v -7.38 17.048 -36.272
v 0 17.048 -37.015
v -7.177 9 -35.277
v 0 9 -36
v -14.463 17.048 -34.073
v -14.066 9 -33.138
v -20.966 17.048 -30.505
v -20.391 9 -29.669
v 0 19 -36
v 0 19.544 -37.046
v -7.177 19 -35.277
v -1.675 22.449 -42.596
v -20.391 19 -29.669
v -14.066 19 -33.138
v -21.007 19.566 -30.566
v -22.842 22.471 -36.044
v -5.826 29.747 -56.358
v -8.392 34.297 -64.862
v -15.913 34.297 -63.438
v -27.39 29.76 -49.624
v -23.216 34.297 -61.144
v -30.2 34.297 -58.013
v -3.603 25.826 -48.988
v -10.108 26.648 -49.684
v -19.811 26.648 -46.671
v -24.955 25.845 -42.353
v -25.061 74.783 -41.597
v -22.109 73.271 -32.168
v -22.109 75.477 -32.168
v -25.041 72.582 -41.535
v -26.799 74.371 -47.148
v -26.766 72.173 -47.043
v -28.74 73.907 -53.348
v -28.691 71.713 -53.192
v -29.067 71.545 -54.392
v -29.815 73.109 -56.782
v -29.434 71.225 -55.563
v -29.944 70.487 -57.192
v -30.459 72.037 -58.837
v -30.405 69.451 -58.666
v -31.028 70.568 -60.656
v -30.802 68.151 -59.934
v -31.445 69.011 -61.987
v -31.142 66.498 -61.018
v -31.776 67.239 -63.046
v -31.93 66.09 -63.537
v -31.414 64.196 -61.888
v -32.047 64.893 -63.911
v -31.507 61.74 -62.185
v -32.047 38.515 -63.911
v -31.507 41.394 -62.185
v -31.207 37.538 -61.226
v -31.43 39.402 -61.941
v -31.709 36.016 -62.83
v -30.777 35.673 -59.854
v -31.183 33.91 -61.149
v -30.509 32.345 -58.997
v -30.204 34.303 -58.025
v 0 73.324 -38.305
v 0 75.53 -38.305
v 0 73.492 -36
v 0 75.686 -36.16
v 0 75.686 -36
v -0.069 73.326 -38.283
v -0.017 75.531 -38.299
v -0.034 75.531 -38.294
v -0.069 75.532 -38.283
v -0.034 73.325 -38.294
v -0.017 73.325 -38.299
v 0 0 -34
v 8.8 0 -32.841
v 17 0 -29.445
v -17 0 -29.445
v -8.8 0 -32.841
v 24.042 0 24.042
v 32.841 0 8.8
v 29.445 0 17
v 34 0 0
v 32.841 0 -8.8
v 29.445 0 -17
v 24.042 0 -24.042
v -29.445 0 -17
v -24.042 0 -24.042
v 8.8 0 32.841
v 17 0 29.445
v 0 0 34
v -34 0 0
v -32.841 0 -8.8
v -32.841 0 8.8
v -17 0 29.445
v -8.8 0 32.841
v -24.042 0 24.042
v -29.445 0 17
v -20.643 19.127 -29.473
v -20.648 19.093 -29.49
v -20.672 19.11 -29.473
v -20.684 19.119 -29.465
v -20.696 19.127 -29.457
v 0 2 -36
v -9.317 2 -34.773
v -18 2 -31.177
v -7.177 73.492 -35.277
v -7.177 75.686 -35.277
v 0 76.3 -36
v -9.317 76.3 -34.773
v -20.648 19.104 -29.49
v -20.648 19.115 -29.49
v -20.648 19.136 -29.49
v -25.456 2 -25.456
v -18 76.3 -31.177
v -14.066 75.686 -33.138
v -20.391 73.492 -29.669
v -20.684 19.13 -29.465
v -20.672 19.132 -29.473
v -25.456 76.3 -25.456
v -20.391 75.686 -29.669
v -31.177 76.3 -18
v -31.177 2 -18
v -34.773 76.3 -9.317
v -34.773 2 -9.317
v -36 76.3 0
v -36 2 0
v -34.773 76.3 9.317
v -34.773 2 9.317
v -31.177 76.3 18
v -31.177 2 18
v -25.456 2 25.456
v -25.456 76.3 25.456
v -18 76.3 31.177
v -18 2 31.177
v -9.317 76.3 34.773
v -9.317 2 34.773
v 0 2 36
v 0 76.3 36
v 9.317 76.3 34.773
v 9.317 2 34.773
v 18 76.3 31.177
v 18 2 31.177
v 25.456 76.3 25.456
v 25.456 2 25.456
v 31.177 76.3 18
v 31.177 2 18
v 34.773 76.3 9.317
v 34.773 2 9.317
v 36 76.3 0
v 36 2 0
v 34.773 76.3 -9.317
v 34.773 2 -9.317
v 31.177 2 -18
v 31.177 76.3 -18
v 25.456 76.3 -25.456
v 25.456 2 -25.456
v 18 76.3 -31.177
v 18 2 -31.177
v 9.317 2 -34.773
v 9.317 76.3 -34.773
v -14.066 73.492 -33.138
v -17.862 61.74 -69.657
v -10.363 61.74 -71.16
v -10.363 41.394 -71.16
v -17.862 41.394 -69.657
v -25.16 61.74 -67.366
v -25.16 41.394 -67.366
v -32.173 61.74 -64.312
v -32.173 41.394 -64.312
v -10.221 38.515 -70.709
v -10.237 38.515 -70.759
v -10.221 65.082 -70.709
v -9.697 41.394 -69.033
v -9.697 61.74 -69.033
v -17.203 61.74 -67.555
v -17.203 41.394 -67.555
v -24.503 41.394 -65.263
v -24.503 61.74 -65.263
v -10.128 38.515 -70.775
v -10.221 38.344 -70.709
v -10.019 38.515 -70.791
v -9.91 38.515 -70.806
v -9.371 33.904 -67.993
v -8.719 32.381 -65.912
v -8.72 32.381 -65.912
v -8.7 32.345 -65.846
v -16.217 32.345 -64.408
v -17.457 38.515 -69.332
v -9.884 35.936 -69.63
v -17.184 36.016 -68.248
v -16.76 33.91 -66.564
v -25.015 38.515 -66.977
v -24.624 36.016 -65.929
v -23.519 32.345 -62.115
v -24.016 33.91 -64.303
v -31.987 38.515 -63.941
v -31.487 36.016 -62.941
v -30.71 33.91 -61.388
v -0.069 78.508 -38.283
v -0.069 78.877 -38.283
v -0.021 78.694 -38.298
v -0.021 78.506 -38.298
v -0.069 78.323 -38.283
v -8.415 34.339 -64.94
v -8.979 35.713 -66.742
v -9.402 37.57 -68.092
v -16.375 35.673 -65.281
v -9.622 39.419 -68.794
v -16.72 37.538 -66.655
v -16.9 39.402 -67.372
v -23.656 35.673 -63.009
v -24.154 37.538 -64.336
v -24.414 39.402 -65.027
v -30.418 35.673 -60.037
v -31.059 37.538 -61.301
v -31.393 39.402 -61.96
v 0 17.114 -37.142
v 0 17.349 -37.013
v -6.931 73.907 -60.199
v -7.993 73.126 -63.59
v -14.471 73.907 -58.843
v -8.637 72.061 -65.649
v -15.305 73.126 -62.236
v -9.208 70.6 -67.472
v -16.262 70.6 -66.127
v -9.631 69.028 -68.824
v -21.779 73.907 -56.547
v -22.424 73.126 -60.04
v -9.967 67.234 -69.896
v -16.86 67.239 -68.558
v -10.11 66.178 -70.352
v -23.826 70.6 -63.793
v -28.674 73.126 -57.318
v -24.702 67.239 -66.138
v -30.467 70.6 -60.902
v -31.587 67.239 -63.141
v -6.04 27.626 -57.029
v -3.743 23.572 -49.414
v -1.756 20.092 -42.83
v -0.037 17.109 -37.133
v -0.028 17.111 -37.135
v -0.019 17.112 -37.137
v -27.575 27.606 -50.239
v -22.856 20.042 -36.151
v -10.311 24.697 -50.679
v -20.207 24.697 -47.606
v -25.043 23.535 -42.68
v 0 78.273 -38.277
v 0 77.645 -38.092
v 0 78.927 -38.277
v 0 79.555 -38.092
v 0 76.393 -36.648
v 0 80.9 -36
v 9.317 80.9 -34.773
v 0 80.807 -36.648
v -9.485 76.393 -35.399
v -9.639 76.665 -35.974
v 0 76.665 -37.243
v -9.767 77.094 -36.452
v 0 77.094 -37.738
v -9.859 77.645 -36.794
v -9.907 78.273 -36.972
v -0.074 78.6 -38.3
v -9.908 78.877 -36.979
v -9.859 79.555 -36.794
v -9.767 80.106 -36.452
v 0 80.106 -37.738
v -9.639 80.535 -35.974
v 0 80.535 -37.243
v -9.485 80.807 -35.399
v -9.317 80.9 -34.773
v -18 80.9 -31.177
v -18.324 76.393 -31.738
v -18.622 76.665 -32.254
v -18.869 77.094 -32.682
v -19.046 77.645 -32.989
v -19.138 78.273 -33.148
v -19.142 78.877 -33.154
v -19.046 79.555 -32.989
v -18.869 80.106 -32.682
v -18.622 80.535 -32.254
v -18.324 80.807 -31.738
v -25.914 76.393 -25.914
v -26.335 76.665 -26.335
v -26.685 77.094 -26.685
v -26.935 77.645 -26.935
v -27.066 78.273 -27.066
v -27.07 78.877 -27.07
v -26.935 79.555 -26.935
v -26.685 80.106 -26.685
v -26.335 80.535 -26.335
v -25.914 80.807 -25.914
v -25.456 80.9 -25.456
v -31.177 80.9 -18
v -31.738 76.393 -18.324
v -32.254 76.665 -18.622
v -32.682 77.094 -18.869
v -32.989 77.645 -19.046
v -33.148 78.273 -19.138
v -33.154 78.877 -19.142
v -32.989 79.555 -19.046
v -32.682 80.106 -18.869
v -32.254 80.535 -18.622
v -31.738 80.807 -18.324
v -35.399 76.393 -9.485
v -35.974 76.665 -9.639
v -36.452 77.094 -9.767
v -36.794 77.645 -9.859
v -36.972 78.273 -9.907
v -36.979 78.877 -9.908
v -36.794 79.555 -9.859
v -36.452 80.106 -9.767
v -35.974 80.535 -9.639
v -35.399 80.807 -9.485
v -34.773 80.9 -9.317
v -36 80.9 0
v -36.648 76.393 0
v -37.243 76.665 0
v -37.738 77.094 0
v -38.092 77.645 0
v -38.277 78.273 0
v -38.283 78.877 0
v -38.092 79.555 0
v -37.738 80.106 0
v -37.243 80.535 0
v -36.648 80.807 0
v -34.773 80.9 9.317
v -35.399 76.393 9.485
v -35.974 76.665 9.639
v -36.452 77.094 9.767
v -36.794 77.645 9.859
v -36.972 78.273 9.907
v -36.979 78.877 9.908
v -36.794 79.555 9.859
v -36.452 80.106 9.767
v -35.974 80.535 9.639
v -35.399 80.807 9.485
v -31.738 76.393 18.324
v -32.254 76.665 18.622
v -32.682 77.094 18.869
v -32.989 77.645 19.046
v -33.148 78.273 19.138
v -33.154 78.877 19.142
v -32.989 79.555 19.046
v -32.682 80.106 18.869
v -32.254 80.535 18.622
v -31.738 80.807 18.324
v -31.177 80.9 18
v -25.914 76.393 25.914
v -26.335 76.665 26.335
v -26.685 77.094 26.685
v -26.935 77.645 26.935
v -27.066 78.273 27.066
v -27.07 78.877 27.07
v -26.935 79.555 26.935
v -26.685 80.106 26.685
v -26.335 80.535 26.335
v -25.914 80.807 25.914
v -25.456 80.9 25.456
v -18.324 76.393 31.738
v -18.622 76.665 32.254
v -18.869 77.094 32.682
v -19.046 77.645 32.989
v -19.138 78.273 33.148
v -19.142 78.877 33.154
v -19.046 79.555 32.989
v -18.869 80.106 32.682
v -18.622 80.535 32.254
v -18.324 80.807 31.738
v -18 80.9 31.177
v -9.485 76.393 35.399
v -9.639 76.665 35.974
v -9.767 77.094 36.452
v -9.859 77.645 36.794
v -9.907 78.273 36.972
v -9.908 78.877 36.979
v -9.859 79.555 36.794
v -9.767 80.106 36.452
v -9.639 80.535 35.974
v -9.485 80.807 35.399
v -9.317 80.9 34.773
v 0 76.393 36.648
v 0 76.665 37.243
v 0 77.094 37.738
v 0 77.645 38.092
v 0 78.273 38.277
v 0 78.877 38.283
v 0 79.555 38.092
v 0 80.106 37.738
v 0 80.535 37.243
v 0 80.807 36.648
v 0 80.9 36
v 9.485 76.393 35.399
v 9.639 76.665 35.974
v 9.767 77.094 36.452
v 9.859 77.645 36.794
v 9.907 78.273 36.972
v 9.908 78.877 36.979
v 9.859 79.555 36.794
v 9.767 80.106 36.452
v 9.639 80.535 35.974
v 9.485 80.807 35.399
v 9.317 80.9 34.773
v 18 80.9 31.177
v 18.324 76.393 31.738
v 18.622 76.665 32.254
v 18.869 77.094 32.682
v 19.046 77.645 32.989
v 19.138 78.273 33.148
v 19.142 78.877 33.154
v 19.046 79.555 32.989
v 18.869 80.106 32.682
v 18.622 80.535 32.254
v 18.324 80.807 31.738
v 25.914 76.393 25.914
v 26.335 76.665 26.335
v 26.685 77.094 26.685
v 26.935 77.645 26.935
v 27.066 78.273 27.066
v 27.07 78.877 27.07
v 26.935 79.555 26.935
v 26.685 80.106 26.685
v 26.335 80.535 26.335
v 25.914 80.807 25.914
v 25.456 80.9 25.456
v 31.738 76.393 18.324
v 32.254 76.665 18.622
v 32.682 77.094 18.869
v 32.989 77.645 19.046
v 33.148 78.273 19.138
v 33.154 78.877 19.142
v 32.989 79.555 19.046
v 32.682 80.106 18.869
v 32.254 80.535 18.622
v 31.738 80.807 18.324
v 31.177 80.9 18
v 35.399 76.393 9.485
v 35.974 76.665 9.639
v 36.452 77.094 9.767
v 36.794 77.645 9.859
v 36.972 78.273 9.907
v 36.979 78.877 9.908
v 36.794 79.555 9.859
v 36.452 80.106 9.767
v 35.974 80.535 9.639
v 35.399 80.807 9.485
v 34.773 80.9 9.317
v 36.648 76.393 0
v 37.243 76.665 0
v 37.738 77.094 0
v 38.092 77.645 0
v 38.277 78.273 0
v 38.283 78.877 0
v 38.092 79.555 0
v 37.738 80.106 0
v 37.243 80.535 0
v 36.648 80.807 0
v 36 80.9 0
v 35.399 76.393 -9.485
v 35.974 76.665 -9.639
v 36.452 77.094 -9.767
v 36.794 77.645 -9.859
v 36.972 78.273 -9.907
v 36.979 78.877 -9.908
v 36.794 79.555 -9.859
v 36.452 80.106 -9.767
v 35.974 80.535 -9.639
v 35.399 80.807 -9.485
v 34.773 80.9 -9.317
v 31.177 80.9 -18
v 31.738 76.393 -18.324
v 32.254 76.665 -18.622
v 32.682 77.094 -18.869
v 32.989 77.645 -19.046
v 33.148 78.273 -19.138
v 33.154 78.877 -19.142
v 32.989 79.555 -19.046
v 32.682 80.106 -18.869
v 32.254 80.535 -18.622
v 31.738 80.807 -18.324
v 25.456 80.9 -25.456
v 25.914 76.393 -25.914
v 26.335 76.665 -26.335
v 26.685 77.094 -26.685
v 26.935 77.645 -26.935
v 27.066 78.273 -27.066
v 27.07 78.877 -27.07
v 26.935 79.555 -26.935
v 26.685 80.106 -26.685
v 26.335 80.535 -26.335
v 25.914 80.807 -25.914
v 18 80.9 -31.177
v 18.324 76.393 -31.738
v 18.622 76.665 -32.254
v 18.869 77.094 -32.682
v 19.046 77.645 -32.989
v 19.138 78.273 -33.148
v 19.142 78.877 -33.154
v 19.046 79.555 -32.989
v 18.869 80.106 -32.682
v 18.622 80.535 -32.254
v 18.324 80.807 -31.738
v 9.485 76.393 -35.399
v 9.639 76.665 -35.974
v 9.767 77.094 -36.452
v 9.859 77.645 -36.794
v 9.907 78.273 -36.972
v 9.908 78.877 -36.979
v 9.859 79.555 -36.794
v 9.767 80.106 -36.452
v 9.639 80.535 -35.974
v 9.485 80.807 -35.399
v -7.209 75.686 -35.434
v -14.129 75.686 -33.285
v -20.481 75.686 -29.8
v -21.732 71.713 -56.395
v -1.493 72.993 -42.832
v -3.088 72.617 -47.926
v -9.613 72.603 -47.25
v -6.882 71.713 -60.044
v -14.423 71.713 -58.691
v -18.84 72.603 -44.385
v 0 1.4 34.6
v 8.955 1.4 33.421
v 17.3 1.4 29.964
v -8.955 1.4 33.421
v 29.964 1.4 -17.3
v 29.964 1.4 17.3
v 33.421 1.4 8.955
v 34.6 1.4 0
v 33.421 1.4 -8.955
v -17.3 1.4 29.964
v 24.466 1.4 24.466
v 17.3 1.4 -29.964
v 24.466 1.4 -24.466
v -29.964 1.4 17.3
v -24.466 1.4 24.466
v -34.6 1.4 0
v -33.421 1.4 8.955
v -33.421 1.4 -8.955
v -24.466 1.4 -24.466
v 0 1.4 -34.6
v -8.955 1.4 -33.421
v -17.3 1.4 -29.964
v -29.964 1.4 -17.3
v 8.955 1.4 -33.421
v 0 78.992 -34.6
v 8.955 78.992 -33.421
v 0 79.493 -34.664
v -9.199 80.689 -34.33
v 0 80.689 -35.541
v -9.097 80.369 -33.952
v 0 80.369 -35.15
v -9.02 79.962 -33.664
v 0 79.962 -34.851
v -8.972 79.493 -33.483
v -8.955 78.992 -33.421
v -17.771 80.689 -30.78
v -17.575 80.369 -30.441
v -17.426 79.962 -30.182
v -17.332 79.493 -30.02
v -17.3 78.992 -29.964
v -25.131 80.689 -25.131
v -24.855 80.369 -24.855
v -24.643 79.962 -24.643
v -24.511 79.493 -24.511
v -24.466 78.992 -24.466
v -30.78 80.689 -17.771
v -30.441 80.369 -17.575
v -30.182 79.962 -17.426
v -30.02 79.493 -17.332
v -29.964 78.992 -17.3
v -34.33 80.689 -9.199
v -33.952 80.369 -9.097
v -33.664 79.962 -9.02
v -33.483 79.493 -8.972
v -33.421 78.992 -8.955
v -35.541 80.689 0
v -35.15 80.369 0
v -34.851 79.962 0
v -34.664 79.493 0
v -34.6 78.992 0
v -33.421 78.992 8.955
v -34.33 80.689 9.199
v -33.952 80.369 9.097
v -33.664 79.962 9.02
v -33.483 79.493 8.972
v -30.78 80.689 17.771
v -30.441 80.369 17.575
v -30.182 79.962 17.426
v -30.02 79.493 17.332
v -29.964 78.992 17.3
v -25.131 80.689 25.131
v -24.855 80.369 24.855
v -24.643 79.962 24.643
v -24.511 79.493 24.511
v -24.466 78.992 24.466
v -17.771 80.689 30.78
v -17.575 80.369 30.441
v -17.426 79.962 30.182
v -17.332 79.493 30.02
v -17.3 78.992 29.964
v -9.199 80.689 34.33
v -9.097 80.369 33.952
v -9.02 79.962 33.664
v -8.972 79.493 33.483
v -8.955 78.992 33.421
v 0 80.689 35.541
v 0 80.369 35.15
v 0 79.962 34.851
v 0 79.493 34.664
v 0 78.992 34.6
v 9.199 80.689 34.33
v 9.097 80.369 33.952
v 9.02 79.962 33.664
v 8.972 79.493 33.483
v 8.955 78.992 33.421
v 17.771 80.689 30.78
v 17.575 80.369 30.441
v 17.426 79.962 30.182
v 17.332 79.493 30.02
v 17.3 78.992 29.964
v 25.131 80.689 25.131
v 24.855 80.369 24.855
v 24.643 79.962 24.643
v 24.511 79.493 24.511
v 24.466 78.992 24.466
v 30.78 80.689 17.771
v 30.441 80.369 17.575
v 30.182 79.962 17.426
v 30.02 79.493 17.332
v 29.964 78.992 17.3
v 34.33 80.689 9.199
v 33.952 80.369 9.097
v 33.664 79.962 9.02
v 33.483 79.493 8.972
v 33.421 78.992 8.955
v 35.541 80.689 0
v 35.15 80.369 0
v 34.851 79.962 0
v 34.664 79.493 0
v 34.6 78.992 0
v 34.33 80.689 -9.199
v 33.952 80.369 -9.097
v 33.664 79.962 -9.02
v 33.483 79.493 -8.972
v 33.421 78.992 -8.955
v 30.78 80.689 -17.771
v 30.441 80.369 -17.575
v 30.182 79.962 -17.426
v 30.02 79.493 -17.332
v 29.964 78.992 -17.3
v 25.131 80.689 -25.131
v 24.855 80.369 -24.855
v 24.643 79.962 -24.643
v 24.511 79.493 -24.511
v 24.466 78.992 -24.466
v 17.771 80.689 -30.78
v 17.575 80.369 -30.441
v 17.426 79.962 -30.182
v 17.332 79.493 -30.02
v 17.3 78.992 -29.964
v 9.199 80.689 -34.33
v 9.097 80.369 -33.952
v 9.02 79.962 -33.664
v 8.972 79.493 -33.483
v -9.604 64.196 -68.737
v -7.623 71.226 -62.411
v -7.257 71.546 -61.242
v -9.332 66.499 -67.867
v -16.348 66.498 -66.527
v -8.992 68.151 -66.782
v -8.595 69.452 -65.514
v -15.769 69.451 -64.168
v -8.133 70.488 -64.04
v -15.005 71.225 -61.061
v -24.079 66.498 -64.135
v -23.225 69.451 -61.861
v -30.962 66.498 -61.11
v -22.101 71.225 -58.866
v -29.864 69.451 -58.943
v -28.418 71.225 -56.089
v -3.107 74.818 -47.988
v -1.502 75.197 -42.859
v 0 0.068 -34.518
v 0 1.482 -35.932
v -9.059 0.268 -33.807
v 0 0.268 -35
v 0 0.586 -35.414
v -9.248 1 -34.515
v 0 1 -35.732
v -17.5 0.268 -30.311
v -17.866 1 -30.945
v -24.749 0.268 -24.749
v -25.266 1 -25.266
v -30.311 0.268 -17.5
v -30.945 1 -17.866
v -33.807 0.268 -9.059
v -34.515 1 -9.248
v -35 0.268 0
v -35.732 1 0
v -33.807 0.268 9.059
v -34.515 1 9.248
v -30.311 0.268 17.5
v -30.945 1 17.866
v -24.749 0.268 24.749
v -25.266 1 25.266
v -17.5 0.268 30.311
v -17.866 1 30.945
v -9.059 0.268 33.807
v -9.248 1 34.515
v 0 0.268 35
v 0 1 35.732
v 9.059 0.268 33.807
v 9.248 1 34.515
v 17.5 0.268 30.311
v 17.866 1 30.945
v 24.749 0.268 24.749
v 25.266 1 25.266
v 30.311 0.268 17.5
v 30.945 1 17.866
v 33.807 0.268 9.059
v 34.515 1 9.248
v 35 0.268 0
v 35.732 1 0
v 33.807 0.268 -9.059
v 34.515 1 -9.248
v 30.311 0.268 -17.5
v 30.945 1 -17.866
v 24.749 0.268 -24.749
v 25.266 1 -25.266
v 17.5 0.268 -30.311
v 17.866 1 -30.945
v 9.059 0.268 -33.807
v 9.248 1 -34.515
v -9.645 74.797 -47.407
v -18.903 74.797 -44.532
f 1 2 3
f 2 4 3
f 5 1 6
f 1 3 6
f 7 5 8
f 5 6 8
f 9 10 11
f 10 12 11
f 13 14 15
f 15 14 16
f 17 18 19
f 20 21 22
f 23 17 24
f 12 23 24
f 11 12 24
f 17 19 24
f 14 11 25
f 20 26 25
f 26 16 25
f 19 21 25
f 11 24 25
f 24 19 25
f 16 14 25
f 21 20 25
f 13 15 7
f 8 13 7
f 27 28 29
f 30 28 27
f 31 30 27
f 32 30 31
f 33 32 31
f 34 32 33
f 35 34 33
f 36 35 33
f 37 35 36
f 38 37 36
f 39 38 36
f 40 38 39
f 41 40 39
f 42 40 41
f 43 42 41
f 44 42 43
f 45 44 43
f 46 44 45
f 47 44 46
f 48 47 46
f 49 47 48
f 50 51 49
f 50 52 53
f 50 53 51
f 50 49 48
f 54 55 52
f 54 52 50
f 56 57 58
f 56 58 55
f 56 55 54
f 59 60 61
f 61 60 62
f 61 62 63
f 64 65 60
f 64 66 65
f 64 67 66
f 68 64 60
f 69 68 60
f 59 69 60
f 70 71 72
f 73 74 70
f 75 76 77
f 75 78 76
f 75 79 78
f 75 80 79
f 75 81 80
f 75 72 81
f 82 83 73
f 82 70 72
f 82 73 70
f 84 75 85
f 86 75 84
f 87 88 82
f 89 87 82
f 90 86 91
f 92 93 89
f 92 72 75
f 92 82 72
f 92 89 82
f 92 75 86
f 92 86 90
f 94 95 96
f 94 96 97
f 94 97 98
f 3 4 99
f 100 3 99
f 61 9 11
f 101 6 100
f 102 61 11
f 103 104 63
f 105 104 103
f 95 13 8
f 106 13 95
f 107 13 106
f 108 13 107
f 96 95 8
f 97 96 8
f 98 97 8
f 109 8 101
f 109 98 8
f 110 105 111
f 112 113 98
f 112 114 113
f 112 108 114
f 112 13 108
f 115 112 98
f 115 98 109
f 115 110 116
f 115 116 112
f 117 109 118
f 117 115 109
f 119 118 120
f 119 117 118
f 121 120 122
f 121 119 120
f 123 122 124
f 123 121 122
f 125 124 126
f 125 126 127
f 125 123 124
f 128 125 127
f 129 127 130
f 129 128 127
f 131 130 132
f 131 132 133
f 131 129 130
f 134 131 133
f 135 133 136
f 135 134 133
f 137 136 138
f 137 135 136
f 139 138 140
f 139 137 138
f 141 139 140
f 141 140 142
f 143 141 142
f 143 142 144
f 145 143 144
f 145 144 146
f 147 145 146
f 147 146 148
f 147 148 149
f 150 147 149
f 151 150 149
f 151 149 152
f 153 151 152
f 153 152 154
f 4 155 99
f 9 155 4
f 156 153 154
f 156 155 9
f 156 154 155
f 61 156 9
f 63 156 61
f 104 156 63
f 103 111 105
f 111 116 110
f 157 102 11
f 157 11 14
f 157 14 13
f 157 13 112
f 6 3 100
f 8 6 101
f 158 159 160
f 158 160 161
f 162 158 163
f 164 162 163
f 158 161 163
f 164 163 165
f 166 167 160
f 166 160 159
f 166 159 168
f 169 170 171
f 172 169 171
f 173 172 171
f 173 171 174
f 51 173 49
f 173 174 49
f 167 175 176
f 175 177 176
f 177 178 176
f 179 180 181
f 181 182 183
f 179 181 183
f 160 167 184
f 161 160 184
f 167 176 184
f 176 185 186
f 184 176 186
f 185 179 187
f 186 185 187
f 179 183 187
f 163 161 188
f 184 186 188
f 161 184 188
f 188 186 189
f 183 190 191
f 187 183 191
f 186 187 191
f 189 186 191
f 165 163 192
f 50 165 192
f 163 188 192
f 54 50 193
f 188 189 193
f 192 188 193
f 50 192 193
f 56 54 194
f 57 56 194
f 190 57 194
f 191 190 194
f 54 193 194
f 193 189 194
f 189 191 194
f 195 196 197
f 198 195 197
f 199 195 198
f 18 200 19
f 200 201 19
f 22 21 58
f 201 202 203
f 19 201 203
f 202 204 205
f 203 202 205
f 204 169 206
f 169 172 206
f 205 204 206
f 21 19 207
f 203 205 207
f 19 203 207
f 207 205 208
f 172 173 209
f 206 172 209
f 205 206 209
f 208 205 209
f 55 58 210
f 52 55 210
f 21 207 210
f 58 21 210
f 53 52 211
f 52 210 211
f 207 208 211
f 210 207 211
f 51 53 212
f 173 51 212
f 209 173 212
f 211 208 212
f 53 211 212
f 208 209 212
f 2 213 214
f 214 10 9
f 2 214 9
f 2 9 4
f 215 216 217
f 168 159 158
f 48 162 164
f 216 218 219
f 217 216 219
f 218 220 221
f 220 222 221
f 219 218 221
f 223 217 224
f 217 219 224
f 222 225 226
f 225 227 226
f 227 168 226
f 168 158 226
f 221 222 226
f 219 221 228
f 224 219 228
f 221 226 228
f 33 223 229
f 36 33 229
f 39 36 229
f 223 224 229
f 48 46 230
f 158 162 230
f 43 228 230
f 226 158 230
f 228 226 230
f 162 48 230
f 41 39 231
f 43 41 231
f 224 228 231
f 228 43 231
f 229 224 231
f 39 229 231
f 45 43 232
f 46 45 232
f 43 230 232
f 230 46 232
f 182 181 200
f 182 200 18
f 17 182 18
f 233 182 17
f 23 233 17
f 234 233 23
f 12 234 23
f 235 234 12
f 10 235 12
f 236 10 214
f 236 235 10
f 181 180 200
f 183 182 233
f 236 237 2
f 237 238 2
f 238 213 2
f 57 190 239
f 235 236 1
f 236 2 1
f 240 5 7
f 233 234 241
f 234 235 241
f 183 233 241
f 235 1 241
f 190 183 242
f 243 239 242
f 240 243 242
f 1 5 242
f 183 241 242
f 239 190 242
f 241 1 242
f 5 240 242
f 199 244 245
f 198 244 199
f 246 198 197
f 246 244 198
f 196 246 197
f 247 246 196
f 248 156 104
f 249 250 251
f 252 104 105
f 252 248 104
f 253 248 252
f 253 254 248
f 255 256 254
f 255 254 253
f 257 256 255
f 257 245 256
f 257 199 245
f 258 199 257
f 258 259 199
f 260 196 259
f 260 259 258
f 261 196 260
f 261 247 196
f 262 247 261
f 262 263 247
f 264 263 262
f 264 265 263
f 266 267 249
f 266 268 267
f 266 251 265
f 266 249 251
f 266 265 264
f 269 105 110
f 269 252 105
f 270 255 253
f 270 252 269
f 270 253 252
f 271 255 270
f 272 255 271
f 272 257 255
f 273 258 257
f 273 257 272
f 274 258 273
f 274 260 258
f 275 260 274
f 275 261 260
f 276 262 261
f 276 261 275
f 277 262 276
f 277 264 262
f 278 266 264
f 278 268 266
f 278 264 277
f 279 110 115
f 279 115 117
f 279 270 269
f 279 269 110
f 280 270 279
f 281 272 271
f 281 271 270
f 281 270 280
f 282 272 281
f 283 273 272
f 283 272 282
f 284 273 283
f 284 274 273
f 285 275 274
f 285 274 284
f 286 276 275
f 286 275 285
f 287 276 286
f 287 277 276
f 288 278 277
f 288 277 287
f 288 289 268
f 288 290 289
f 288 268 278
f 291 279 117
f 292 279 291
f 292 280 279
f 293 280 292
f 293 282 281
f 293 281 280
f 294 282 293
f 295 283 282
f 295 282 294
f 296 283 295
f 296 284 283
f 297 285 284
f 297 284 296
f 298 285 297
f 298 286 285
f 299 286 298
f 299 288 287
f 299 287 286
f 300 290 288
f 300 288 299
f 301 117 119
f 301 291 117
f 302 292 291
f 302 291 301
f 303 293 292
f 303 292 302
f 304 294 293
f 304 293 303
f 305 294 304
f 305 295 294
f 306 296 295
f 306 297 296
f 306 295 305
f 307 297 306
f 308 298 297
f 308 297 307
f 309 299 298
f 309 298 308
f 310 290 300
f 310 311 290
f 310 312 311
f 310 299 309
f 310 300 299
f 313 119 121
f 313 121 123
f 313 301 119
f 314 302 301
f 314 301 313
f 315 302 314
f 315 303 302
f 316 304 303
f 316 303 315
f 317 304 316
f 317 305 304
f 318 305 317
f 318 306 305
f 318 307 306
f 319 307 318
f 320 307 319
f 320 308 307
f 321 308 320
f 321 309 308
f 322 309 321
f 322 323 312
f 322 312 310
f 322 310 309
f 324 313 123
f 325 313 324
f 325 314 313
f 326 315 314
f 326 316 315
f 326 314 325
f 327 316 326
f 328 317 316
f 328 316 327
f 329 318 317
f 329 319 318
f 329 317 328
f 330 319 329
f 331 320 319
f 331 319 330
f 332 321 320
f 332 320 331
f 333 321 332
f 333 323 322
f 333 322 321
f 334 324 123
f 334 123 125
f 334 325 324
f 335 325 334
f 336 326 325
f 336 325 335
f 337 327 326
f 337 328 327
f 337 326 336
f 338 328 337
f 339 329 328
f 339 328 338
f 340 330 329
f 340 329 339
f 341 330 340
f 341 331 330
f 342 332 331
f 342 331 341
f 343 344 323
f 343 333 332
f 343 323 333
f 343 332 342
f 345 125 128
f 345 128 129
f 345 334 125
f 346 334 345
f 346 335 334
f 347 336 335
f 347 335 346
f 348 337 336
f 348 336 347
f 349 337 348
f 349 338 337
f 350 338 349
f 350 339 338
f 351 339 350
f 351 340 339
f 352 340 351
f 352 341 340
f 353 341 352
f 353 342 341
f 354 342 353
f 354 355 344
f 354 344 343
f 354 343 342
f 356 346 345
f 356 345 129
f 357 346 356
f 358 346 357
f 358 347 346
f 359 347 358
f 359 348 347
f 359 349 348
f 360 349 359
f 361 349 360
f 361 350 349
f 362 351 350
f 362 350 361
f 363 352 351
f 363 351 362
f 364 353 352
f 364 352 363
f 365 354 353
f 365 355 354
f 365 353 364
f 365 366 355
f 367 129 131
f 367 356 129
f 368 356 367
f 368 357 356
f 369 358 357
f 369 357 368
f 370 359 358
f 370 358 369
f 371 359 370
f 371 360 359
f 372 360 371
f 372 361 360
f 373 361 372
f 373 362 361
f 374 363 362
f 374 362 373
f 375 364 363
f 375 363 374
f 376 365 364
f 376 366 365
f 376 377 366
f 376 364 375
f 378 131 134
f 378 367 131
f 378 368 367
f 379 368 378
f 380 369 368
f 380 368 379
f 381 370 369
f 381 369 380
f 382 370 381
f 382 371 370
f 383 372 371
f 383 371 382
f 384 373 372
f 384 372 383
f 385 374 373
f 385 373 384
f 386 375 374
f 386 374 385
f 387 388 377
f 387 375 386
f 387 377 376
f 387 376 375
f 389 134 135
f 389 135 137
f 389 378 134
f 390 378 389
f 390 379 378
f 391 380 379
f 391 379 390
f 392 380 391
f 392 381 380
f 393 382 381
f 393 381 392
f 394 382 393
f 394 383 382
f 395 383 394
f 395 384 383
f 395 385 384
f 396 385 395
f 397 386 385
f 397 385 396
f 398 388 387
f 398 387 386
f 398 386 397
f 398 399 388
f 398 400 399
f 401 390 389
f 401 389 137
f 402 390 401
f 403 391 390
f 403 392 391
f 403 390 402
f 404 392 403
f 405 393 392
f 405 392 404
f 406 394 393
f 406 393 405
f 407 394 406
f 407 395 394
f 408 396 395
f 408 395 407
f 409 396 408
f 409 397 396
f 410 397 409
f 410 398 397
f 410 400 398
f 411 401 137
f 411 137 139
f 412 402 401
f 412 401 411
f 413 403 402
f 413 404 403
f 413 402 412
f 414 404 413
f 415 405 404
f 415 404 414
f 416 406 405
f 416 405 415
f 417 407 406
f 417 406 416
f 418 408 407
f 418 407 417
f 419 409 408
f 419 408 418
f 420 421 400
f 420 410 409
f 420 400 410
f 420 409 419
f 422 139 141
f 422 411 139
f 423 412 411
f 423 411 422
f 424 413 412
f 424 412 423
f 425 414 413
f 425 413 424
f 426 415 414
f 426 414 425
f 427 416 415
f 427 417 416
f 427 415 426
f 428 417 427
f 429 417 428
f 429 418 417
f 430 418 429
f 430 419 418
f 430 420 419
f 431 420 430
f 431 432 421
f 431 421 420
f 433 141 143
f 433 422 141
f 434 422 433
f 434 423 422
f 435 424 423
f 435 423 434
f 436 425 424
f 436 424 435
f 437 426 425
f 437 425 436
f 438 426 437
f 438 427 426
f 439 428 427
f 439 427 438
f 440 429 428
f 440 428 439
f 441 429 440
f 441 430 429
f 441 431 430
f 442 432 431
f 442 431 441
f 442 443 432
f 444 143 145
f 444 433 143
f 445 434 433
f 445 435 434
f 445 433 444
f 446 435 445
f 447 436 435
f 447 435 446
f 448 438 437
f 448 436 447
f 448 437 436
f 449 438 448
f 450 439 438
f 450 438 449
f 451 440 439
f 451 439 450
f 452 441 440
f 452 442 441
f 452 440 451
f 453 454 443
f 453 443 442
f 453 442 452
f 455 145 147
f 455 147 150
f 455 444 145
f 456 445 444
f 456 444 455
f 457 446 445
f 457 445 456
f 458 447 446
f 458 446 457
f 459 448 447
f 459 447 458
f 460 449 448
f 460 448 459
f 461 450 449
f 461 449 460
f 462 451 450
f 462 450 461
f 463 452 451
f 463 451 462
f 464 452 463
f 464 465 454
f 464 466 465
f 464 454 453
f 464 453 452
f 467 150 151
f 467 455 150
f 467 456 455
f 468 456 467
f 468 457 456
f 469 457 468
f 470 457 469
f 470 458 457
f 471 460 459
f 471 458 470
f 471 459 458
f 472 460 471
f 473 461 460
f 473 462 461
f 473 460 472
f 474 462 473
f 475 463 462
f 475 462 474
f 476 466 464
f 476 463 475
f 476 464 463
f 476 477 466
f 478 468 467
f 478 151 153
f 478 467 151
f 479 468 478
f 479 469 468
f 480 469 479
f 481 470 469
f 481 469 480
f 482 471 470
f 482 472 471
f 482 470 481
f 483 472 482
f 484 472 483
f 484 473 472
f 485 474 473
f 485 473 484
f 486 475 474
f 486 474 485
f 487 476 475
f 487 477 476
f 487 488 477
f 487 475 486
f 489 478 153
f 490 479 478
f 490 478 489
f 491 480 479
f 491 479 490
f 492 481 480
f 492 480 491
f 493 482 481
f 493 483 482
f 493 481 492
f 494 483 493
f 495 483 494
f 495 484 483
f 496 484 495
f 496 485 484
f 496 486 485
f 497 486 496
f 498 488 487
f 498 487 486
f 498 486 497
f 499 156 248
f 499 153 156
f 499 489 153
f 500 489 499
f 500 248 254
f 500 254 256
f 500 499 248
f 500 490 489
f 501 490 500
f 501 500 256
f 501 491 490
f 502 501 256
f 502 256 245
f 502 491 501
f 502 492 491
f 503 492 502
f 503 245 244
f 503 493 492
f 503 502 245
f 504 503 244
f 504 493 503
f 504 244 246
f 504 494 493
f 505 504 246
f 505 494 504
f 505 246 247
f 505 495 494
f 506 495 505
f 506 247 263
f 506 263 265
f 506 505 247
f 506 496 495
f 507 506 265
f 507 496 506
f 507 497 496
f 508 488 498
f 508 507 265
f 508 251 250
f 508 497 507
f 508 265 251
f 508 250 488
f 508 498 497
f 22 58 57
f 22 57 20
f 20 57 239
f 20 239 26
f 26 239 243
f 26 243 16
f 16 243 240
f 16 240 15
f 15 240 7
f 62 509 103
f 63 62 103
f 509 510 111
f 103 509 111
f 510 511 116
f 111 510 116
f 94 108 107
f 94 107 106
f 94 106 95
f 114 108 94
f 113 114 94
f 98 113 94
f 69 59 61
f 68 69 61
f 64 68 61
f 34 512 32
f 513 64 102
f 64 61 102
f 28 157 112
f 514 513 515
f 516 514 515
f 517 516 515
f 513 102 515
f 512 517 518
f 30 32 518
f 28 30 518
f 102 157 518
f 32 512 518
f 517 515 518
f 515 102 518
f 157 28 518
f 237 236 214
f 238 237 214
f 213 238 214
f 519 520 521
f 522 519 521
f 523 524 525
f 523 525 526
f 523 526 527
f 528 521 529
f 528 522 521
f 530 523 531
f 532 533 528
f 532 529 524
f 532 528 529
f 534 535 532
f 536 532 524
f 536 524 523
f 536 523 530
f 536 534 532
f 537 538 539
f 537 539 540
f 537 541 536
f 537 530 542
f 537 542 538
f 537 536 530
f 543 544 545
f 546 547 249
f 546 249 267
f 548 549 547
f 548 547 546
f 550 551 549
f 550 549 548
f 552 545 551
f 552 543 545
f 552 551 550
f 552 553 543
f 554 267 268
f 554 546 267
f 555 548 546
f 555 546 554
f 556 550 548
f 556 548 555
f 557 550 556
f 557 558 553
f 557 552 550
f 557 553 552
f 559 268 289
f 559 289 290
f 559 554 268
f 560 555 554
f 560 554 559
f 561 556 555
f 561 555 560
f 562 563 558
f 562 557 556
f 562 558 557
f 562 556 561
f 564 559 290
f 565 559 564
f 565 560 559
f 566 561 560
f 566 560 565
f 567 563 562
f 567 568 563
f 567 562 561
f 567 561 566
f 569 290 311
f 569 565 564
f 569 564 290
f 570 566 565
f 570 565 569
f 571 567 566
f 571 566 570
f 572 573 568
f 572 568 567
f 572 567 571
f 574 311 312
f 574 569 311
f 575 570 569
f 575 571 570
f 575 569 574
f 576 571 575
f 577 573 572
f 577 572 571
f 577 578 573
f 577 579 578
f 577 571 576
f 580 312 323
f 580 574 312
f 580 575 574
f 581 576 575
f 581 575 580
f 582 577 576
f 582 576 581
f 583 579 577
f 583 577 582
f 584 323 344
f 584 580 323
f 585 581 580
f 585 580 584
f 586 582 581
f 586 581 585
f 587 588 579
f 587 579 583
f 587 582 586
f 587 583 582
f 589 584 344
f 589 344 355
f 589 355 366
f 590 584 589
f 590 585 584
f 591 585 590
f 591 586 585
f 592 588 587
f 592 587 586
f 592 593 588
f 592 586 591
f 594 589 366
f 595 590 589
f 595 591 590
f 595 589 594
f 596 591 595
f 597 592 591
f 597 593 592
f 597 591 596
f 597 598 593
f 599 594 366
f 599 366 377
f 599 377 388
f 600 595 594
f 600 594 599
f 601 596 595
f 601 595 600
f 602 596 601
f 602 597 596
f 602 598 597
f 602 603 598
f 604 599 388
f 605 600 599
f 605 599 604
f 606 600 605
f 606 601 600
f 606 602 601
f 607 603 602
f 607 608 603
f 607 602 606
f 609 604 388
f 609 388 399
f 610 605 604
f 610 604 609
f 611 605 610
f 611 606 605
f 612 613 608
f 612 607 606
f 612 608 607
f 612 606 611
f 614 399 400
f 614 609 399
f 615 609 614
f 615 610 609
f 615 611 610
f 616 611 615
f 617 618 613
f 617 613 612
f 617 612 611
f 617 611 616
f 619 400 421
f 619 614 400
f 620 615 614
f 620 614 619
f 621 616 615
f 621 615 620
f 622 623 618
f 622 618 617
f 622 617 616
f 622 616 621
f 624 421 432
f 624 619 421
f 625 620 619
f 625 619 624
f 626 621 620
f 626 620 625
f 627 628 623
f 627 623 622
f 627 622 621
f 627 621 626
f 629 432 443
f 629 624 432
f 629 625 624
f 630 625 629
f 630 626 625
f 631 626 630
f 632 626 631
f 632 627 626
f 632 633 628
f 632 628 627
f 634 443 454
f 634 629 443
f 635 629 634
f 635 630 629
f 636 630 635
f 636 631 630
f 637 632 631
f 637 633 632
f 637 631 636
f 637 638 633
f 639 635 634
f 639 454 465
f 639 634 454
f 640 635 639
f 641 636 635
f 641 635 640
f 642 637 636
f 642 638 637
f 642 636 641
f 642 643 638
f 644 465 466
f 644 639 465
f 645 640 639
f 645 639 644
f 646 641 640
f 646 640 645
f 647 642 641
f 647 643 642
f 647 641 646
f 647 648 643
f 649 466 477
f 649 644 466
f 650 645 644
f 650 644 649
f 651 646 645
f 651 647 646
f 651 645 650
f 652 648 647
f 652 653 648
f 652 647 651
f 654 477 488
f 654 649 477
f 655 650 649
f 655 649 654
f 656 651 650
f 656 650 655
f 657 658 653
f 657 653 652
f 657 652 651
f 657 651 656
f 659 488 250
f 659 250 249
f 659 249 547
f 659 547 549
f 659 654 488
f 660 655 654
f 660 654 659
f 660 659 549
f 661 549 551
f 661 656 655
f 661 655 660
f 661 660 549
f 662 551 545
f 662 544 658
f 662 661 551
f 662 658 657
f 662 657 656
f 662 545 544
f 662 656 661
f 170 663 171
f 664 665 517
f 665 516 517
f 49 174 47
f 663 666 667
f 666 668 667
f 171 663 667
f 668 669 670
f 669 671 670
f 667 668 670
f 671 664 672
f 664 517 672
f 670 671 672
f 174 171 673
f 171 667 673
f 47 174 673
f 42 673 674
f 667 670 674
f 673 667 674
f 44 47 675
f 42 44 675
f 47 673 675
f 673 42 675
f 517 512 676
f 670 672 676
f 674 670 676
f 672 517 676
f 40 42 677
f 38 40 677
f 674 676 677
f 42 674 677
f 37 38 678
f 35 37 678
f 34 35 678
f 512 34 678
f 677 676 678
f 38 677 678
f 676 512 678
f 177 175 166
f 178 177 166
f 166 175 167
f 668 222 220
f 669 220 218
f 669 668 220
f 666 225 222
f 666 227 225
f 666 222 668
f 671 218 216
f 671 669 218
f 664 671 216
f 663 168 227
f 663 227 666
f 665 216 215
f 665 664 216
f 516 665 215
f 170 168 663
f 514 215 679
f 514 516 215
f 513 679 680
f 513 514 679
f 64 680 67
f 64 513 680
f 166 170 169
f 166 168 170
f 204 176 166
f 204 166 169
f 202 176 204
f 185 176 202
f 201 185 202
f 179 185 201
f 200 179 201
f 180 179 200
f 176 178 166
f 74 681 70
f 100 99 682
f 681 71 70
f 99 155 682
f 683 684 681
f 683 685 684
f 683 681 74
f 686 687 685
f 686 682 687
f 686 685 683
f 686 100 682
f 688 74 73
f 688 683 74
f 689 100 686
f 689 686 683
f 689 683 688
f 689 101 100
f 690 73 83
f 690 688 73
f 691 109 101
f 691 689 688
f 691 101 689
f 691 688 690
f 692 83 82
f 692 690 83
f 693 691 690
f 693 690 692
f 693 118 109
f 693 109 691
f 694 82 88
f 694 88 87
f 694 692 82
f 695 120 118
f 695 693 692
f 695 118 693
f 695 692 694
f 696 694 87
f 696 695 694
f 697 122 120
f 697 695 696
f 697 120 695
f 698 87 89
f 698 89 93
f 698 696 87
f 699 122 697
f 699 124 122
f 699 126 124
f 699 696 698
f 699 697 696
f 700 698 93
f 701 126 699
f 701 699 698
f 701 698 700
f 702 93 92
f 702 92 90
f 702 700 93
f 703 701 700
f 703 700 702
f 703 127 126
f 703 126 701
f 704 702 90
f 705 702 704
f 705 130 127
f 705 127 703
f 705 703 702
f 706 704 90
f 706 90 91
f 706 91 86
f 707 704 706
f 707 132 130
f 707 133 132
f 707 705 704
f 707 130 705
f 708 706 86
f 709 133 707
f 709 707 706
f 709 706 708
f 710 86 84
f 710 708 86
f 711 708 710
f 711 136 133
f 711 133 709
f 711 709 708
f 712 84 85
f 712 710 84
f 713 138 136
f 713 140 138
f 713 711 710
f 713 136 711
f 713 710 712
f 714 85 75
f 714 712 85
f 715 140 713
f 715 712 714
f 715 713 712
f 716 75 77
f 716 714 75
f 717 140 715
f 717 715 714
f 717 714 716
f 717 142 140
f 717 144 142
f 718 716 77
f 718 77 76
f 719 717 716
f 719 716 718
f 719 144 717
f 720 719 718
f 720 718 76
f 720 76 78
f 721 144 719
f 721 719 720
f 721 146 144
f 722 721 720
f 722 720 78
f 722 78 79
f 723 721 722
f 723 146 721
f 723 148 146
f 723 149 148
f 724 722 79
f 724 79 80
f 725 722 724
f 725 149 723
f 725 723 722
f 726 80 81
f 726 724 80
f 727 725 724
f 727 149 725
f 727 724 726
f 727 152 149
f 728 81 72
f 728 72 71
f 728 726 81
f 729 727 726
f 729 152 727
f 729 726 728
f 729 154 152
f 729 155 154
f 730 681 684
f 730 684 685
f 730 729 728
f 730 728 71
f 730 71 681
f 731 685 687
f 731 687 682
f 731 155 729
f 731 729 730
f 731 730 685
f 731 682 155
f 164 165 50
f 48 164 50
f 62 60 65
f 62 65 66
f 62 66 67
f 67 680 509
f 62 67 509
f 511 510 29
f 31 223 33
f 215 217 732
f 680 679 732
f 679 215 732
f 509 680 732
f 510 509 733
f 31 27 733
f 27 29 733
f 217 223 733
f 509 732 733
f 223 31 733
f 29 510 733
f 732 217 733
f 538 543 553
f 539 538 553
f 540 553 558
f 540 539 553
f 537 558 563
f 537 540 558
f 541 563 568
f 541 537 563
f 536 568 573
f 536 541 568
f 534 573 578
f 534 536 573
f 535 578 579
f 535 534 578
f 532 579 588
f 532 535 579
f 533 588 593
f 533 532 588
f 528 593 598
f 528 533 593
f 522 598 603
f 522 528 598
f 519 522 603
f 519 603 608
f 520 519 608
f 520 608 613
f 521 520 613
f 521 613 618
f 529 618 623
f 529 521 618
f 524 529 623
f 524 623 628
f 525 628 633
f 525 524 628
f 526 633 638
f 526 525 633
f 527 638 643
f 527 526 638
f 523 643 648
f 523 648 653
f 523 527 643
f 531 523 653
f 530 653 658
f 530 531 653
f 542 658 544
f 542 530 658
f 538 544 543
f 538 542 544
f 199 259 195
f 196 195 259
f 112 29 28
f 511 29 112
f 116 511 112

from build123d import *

# Parameters (mm, degrees)
FILLET1_R          = 2
FILLET2_R          = 2
REVOLVE3_ANGLE     = 34.5
CUT_EXTRUDE1_START = 17.048322615
CUT_EXTRUDE1_DEPTH = 62.951677385
CUT_EXTRUDE2_REACH = 148.807
SKETCH6_W          = 2.656451676
SKETCH6_H          = 26.566734065
SKETCH6_W_2        = 2.656451675
CUT_EXTRUDE4_DEPTH = 3.1


with BuildPart() as part:
    # Sketch3 → Revolve2 (revolve)
    with BuildSketch(Plane(origin=(0, 0, 0), x_dir=(0, 0, -1), z_dir=(1, 0, 0))):
        with BuildLine():
            Line((0, 0), (36, 0))
            Line((36, 0), (36, 76.3))
            ThreePointArc((36, 76.3), (38.3, 78.6), (36, 80.9))
            Line((36, 80.9), (34.6, 80.9))
            Line((34.6, 80.9), (34.6, 76.3))
            Line((34.6, 76.3), (34.6, 1.4))
            Line((34.6, 1.4), (0, 1.4))
            Line((0, 1.4), (0, 0))
        make_face()
    revolve(axis=Axis((0, 0, 0), (0, 1, 0)))

    # Fillet1
    # the kernel refuses this fillet: 2 mm, written as the material it takes off along each edge
    with BuildSketch(Plane(origin=(0, 80.9, 0), x_dir=(0, 0, -1), z_dir=(1, 0, 0))) as fillet1_piece_1:
        with BuildLine():
            CenterArc((36.6, -1.907878403), FILLET1_R, 107.457603124, 72.542396876)
            Line((34.6, -1.907878403), (34.56, -1.907878403))
            Line((34.56, -1.907878403), (34.56, 0))
            Line((34.56, 0), (34.6, 0.04))
            ThreePointArc((34.6, 0.04), (35.3, 0.04), (35.988, 0.038157568))
            Line((35.988, 0.038157568), (36, 0))
        make_face()
    revolve(axis=Axis((0, 80.9, 0), (0, 1, 0)), mode=Mode.SUBTRACT)

    # Fillet2
    fillet2_edges = [part.edges().sort_by_distance(p)[0] for p in [
        (0, 0, 36),
    ]]
    fillet(fillet2_edges, radius=FILLET2_R)

    # Sketch4 → Revolve3 (revolve)
    with BuildSketch(Plane(origin=(0, 0, 0), x_dir=(0, 0, -1), z_dir=(1, 0, 0))):
        with BuildLine():
            Line((66.418368133, 32.345231294), (37.015359732, 17.048322615))
            Line((37.015359732, 17.048322615), (36, 9))
            Line((36, 9), (36, 19))
            Line((36, 19), (65.403008401, 34.296908679))
            ThreePointArc((65.403008401, 34.296908679), (68.549568046, 37.242877581), (69.710791194, 41.393917351))
            Line((69.710791194, 41.393917351), (69.710791194, 61.739552218))
            ThreePointArc((69.710791194, 61.739552218), (67.034063035, 68.549081537), (60.436853284, 71.71315908))
            Line((60.436853284, 71.71315908), (36, 73.492121597))
            Line((36, 73.492121597), (36, 75.686315107))
            Line((36, 75.686315107), (36.15973366, 75.686315107))
            Line((36.15973366, 75.686315107), (60.596586944, 73.90735259))
            ThreePointArc((60.596586944, 73.90735259), (68.64518284, 70.047177987), (71.910791194, 61.739552218))
            Line((71.910791194, 61.739552218), (71.910791194, 41.393917351))
            ThreePointArc((71.910791194, 41.393917351), (70.43023168, 36.101341644), (66.418368133, 32.345231294))
        make_face()
    revolve(axis=Axis((0, 0, 0), (0, 1, 0)), revolution_arc=REVOLVE3_ANGLE)

    # Cut-Extrude1: read off the stored shape, not the designer's step
    # Cut-Extrude1 outline → Cut-Extrude1 (cut)
    with BuildSketch(Plane(origin=(0, 0, 0), x_dir=(1, 0, 0), z_dir=(0, 1, 0)).offset(CUT_EXTRUDE1_START)):
        with BuildLine():
            Line((-22.108668816, 32.168312739), (-32.047363038, 63.91139403))
            Line((-32.047363038, 63.91139403), (-34.272292741, 63.218445413))
            ThreePointArc((-34.272292741, 63.218445413), (-37.553605301, 61.326084329), (-40.730720635, 59.263566268))
            Line((-40.730720635, 59.263566268), (-22.108668816, 32.168312739))
        make_face()
        with BuildLine():
            Line((0, 38.304663112), (0, 71.910791194))
            ThreePointArc((0, 71.910791194), (-3.848061143, 71.807759438), (-7.685095499, 71.498959414))
            Line((-7.685095499, 71.498959414), (-10.221387179, 70.709037913))
            Line((-10.221387179, 70.709037913), (-0.068922433, 38.283197398))
            Line((-0.068922433, 38.283197398), (0, 38.304663112))
        make_face()
    extrude(amount=CUT_EXTRUDE1_DEPTH, mode=Mode.SUBTRACT)

    # Cut-Extrude2: up to this plane
    cut_extrude2_end = Plane(origin=(-22.697932128, 11.704801269, -66.823250171), z_dir=(0.2973592990807489, 0, 0.9547656504348101))
    # Sketch6 → Cut-Extrude2 (cut, up to the surface)
    with BuildSketch(Plane(origin=(-21.486572607, 0, -68.625717394), x_dir=(-0.9543173737069837, 0, 0.2987948296758254), z_dir=(-0.2987948296758254, 0, -0.9543173737069837)), mode=Mode.PRIVATE) as cut_extrude2_sk1:
        with Locations((-12.701273409, 51.798619412)):
            Rectangle(SKETCH6_W, SKETCH6_H)
    cut_extrude2_tool1 = split(extrude(cut_extrude2_sk1.sketch, amount=-CUT_EXTRUDE2_REACH, mode=Mode.PRIVATE), bisect_by=cut_extrude2_end, keep=Keep.BOTH, mode=Mode.PRIVATE)
    add(cut_extrude2_tool1.solids().sort_by_distance((-9.365527, 51.798619, -72.420792))[0], mode=Mode.SUBTRACT)
    # Sketch6 → Cut-Extrude2 (cut, up to the surface)
    with BuildSketch(Plane(origin=(-21.486572607, 0, -68.625717394), x_dir=(-0.9543173737069837, 0, 0.2987948296758254), z_dir=(-0.2987948296758254, 0, -0.9543173737069837)), mode=Mode.PRIVATE) as cut_extrude2_sk2:
        with Locations((12.815187073, 51.798619412)):
            Rectangle(SKETCH6_W_2, SKETCH6_H)
    cut_extrude2_tool2 = split(extrude(cut_extrude2_sk2.sketch, amount=-CUT_EXTRUDE2_REACH, mode=Mode.PRIVATE), bisect_by=cut_extrude2_end, keep=Keep.BOTH, mode=Mode.PRIVATE)
    add(cut_extrude2_tool2.solids().sort_by_distance((-33.716328, 51.798619, -64.796606))[0], mode=Mode.SUBTRACT)

    # Sketch7 → Cut-Extrude4 (cut)
    with BuildSketch(Plane(origin=(-0.27023011, -1.738396159, -0.863084843), x_dir=(-0.9904458888228052, 0.12351648622229915, 0.06132388560177964), z_dir=(-0.13790192643325755, -0.8871260840574537, -0.4404433785072538))):
        Polygon((30.594390354, 67.226140182), (21.000465395, 34.90437265), (24.682862396, 33.889860102), (33.633833507, 66.37938352), align=None)
        Polygon((5.560376818, 74.302956644), (8.594011842, 73.435621609), (-0.126879919, 40.867445433), (-3.796298497, 41.927940925), align=None)
    extrude(amount=-CUT_EXTRUDE4_DEPTH, mode=Mode.SUBTRACT)


solid = part.part
